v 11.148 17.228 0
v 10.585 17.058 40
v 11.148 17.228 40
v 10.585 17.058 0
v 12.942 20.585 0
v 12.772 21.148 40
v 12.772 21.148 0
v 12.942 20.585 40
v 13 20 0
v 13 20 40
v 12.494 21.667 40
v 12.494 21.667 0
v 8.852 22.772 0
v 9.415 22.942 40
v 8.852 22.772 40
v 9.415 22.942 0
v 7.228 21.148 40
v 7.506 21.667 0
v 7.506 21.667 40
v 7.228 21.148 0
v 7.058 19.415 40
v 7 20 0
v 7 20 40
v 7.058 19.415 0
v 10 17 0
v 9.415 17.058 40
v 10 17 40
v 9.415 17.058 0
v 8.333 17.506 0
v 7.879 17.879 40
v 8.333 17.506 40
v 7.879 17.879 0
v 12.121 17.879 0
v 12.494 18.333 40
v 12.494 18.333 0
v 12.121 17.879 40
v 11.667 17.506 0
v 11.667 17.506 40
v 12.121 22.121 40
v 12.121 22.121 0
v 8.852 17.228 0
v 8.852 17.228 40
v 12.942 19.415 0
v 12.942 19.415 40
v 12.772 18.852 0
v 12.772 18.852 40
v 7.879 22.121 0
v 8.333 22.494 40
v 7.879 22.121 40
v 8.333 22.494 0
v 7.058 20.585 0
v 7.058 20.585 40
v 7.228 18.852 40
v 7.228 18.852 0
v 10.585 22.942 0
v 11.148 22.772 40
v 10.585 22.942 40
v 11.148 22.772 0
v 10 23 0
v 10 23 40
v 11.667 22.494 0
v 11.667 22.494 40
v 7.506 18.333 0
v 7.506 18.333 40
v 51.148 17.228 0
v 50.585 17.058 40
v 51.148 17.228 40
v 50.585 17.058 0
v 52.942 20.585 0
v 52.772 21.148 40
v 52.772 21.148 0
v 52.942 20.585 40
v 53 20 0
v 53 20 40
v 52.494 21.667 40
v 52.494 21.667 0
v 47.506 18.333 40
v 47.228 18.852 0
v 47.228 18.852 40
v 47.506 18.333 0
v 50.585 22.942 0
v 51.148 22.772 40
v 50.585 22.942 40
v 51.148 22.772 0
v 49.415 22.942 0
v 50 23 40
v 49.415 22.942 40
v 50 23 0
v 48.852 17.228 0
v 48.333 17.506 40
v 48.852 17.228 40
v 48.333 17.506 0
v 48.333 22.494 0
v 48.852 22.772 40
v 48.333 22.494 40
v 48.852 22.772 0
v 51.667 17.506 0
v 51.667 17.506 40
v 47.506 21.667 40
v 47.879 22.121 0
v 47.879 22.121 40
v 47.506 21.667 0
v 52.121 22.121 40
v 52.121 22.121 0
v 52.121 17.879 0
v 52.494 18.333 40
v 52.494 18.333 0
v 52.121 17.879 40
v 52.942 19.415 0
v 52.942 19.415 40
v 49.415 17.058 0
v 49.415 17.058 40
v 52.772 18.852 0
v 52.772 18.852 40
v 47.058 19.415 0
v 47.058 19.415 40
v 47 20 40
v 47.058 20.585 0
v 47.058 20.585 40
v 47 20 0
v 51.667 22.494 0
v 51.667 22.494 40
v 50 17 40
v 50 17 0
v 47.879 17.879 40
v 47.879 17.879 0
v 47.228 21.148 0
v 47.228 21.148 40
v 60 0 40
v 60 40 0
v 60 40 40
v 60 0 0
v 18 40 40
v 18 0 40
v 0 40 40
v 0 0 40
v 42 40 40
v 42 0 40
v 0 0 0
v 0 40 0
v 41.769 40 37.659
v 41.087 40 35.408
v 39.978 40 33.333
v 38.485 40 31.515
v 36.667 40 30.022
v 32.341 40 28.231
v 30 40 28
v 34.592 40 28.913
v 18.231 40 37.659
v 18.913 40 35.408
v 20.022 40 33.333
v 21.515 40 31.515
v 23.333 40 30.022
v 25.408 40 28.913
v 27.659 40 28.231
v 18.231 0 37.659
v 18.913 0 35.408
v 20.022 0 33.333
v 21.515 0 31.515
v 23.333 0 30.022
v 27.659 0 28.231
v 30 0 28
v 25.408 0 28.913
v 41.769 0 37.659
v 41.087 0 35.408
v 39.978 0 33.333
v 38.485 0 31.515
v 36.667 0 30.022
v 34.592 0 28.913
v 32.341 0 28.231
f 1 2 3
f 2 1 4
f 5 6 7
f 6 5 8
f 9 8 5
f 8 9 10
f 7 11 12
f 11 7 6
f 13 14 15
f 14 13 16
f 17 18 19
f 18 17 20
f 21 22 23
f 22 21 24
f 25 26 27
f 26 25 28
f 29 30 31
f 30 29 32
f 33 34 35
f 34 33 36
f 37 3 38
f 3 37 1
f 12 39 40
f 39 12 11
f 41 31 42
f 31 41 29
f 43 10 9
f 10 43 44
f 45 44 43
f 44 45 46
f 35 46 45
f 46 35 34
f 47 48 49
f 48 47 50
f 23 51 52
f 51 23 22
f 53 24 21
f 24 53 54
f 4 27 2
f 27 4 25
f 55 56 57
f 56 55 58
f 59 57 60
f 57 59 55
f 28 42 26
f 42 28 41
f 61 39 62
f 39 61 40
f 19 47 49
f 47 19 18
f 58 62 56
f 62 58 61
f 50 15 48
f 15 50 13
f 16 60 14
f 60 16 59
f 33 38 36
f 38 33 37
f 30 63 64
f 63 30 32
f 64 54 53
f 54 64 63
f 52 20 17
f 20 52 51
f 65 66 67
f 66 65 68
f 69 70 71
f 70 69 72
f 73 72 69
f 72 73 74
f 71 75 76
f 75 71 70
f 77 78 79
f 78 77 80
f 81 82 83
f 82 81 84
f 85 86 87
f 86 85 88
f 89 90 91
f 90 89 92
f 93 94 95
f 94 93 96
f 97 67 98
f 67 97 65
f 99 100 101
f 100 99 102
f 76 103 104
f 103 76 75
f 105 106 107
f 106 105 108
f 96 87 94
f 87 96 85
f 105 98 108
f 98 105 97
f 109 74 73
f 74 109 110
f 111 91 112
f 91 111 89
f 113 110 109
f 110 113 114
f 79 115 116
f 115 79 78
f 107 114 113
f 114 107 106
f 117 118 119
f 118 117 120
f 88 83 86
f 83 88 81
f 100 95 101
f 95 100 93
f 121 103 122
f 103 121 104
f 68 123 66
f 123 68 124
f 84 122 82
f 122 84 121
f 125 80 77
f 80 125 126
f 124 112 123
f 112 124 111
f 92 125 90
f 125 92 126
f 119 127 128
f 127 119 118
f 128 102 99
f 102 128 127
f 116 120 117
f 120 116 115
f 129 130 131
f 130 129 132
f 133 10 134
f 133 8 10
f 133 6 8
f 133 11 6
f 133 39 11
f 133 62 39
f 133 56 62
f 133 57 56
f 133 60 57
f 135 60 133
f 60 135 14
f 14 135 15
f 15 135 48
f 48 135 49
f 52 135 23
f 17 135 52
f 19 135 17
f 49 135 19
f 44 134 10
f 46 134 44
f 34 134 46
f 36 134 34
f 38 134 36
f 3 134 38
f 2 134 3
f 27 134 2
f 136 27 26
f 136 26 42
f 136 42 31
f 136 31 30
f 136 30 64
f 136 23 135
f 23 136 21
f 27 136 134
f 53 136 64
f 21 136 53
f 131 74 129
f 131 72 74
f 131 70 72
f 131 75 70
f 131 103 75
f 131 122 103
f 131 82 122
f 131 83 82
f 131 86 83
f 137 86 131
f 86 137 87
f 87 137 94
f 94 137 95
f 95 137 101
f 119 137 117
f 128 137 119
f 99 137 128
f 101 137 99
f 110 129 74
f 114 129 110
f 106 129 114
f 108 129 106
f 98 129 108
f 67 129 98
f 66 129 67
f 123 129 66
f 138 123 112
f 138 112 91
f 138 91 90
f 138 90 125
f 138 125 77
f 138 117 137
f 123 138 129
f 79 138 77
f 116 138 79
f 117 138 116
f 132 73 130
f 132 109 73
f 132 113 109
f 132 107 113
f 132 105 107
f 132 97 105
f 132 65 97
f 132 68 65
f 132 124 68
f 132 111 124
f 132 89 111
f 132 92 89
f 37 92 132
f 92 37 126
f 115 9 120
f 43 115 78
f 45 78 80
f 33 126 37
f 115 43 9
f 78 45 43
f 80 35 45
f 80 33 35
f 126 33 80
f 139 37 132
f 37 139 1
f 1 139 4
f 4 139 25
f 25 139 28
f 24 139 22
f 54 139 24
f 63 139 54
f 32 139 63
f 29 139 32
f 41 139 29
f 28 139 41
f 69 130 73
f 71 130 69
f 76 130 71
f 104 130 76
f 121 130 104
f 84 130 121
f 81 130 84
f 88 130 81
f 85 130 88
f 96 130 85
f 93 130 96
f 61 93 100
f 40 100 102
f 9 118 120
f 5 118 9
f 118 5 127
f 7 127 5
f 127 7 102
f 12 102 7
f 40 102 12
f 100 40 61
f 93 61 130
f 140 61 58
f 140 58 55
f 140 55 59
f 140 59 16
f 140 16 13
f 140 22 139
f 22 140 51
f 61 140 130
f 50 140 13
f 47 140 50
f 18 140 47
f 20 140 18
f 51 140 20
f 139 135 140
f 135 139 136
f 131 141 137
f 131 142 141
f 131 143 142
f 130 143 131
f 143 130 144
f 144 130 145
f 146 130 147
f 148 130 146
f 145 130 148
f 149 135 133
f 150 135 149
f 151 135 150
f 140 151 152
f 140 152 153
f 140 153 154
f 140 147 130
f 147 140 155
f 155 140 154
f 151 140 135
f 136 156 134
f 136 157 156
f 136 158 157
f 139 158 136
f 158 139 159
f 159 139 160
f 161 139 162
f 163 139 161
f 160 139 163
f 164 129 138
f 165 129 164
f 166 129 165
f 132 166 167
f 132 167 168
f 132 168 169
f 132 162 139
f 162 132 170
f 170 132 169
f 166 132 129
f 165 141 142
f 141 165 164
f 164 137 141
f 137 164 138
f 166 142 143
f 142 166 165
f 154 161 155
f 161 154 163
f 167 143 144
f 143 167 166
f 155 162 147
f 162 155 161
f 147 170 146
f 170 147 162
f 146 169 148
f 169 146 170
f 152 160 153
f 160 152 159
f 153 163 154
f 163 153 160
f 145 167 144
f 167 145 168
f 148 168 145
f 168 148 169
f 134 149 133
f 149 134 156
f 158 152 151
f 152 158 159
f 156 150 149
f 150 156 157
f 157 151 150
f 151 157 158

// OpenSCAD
$fn = 32;

// ----------------------------------------------------------------------
// Saddle clamp: plain shaft clamp
// ----------------------------------------------------------------------

// --- parameters (mm) ---
blk_l = 60;               // block length, X
blk_w = 40;               // block width, Y
blk_h = 40;               // block height
clamp_r = 12;             // shaft groove radius
hole_r = 3;               // bolt hole radius
hole_m = 10;              // bolt hole margin from the ends

saw_depth = clamp_r + 3;  // saw kerf depth

difference() {
  cube([blk_l, blk_w, blk_h]);
  translate([blk_l / 2, -1, blk_h])
    rotate([-90, 0, 0])
      cylinder(h = blk_w + 2, r = clamp_r);
  for (sx = [0, 1])
    translate([sx ? blk_l - hole_m : hole_m, blk_w / 2, -1])
      cylinder(r = hole_r, h = blk_h + 2);
}
